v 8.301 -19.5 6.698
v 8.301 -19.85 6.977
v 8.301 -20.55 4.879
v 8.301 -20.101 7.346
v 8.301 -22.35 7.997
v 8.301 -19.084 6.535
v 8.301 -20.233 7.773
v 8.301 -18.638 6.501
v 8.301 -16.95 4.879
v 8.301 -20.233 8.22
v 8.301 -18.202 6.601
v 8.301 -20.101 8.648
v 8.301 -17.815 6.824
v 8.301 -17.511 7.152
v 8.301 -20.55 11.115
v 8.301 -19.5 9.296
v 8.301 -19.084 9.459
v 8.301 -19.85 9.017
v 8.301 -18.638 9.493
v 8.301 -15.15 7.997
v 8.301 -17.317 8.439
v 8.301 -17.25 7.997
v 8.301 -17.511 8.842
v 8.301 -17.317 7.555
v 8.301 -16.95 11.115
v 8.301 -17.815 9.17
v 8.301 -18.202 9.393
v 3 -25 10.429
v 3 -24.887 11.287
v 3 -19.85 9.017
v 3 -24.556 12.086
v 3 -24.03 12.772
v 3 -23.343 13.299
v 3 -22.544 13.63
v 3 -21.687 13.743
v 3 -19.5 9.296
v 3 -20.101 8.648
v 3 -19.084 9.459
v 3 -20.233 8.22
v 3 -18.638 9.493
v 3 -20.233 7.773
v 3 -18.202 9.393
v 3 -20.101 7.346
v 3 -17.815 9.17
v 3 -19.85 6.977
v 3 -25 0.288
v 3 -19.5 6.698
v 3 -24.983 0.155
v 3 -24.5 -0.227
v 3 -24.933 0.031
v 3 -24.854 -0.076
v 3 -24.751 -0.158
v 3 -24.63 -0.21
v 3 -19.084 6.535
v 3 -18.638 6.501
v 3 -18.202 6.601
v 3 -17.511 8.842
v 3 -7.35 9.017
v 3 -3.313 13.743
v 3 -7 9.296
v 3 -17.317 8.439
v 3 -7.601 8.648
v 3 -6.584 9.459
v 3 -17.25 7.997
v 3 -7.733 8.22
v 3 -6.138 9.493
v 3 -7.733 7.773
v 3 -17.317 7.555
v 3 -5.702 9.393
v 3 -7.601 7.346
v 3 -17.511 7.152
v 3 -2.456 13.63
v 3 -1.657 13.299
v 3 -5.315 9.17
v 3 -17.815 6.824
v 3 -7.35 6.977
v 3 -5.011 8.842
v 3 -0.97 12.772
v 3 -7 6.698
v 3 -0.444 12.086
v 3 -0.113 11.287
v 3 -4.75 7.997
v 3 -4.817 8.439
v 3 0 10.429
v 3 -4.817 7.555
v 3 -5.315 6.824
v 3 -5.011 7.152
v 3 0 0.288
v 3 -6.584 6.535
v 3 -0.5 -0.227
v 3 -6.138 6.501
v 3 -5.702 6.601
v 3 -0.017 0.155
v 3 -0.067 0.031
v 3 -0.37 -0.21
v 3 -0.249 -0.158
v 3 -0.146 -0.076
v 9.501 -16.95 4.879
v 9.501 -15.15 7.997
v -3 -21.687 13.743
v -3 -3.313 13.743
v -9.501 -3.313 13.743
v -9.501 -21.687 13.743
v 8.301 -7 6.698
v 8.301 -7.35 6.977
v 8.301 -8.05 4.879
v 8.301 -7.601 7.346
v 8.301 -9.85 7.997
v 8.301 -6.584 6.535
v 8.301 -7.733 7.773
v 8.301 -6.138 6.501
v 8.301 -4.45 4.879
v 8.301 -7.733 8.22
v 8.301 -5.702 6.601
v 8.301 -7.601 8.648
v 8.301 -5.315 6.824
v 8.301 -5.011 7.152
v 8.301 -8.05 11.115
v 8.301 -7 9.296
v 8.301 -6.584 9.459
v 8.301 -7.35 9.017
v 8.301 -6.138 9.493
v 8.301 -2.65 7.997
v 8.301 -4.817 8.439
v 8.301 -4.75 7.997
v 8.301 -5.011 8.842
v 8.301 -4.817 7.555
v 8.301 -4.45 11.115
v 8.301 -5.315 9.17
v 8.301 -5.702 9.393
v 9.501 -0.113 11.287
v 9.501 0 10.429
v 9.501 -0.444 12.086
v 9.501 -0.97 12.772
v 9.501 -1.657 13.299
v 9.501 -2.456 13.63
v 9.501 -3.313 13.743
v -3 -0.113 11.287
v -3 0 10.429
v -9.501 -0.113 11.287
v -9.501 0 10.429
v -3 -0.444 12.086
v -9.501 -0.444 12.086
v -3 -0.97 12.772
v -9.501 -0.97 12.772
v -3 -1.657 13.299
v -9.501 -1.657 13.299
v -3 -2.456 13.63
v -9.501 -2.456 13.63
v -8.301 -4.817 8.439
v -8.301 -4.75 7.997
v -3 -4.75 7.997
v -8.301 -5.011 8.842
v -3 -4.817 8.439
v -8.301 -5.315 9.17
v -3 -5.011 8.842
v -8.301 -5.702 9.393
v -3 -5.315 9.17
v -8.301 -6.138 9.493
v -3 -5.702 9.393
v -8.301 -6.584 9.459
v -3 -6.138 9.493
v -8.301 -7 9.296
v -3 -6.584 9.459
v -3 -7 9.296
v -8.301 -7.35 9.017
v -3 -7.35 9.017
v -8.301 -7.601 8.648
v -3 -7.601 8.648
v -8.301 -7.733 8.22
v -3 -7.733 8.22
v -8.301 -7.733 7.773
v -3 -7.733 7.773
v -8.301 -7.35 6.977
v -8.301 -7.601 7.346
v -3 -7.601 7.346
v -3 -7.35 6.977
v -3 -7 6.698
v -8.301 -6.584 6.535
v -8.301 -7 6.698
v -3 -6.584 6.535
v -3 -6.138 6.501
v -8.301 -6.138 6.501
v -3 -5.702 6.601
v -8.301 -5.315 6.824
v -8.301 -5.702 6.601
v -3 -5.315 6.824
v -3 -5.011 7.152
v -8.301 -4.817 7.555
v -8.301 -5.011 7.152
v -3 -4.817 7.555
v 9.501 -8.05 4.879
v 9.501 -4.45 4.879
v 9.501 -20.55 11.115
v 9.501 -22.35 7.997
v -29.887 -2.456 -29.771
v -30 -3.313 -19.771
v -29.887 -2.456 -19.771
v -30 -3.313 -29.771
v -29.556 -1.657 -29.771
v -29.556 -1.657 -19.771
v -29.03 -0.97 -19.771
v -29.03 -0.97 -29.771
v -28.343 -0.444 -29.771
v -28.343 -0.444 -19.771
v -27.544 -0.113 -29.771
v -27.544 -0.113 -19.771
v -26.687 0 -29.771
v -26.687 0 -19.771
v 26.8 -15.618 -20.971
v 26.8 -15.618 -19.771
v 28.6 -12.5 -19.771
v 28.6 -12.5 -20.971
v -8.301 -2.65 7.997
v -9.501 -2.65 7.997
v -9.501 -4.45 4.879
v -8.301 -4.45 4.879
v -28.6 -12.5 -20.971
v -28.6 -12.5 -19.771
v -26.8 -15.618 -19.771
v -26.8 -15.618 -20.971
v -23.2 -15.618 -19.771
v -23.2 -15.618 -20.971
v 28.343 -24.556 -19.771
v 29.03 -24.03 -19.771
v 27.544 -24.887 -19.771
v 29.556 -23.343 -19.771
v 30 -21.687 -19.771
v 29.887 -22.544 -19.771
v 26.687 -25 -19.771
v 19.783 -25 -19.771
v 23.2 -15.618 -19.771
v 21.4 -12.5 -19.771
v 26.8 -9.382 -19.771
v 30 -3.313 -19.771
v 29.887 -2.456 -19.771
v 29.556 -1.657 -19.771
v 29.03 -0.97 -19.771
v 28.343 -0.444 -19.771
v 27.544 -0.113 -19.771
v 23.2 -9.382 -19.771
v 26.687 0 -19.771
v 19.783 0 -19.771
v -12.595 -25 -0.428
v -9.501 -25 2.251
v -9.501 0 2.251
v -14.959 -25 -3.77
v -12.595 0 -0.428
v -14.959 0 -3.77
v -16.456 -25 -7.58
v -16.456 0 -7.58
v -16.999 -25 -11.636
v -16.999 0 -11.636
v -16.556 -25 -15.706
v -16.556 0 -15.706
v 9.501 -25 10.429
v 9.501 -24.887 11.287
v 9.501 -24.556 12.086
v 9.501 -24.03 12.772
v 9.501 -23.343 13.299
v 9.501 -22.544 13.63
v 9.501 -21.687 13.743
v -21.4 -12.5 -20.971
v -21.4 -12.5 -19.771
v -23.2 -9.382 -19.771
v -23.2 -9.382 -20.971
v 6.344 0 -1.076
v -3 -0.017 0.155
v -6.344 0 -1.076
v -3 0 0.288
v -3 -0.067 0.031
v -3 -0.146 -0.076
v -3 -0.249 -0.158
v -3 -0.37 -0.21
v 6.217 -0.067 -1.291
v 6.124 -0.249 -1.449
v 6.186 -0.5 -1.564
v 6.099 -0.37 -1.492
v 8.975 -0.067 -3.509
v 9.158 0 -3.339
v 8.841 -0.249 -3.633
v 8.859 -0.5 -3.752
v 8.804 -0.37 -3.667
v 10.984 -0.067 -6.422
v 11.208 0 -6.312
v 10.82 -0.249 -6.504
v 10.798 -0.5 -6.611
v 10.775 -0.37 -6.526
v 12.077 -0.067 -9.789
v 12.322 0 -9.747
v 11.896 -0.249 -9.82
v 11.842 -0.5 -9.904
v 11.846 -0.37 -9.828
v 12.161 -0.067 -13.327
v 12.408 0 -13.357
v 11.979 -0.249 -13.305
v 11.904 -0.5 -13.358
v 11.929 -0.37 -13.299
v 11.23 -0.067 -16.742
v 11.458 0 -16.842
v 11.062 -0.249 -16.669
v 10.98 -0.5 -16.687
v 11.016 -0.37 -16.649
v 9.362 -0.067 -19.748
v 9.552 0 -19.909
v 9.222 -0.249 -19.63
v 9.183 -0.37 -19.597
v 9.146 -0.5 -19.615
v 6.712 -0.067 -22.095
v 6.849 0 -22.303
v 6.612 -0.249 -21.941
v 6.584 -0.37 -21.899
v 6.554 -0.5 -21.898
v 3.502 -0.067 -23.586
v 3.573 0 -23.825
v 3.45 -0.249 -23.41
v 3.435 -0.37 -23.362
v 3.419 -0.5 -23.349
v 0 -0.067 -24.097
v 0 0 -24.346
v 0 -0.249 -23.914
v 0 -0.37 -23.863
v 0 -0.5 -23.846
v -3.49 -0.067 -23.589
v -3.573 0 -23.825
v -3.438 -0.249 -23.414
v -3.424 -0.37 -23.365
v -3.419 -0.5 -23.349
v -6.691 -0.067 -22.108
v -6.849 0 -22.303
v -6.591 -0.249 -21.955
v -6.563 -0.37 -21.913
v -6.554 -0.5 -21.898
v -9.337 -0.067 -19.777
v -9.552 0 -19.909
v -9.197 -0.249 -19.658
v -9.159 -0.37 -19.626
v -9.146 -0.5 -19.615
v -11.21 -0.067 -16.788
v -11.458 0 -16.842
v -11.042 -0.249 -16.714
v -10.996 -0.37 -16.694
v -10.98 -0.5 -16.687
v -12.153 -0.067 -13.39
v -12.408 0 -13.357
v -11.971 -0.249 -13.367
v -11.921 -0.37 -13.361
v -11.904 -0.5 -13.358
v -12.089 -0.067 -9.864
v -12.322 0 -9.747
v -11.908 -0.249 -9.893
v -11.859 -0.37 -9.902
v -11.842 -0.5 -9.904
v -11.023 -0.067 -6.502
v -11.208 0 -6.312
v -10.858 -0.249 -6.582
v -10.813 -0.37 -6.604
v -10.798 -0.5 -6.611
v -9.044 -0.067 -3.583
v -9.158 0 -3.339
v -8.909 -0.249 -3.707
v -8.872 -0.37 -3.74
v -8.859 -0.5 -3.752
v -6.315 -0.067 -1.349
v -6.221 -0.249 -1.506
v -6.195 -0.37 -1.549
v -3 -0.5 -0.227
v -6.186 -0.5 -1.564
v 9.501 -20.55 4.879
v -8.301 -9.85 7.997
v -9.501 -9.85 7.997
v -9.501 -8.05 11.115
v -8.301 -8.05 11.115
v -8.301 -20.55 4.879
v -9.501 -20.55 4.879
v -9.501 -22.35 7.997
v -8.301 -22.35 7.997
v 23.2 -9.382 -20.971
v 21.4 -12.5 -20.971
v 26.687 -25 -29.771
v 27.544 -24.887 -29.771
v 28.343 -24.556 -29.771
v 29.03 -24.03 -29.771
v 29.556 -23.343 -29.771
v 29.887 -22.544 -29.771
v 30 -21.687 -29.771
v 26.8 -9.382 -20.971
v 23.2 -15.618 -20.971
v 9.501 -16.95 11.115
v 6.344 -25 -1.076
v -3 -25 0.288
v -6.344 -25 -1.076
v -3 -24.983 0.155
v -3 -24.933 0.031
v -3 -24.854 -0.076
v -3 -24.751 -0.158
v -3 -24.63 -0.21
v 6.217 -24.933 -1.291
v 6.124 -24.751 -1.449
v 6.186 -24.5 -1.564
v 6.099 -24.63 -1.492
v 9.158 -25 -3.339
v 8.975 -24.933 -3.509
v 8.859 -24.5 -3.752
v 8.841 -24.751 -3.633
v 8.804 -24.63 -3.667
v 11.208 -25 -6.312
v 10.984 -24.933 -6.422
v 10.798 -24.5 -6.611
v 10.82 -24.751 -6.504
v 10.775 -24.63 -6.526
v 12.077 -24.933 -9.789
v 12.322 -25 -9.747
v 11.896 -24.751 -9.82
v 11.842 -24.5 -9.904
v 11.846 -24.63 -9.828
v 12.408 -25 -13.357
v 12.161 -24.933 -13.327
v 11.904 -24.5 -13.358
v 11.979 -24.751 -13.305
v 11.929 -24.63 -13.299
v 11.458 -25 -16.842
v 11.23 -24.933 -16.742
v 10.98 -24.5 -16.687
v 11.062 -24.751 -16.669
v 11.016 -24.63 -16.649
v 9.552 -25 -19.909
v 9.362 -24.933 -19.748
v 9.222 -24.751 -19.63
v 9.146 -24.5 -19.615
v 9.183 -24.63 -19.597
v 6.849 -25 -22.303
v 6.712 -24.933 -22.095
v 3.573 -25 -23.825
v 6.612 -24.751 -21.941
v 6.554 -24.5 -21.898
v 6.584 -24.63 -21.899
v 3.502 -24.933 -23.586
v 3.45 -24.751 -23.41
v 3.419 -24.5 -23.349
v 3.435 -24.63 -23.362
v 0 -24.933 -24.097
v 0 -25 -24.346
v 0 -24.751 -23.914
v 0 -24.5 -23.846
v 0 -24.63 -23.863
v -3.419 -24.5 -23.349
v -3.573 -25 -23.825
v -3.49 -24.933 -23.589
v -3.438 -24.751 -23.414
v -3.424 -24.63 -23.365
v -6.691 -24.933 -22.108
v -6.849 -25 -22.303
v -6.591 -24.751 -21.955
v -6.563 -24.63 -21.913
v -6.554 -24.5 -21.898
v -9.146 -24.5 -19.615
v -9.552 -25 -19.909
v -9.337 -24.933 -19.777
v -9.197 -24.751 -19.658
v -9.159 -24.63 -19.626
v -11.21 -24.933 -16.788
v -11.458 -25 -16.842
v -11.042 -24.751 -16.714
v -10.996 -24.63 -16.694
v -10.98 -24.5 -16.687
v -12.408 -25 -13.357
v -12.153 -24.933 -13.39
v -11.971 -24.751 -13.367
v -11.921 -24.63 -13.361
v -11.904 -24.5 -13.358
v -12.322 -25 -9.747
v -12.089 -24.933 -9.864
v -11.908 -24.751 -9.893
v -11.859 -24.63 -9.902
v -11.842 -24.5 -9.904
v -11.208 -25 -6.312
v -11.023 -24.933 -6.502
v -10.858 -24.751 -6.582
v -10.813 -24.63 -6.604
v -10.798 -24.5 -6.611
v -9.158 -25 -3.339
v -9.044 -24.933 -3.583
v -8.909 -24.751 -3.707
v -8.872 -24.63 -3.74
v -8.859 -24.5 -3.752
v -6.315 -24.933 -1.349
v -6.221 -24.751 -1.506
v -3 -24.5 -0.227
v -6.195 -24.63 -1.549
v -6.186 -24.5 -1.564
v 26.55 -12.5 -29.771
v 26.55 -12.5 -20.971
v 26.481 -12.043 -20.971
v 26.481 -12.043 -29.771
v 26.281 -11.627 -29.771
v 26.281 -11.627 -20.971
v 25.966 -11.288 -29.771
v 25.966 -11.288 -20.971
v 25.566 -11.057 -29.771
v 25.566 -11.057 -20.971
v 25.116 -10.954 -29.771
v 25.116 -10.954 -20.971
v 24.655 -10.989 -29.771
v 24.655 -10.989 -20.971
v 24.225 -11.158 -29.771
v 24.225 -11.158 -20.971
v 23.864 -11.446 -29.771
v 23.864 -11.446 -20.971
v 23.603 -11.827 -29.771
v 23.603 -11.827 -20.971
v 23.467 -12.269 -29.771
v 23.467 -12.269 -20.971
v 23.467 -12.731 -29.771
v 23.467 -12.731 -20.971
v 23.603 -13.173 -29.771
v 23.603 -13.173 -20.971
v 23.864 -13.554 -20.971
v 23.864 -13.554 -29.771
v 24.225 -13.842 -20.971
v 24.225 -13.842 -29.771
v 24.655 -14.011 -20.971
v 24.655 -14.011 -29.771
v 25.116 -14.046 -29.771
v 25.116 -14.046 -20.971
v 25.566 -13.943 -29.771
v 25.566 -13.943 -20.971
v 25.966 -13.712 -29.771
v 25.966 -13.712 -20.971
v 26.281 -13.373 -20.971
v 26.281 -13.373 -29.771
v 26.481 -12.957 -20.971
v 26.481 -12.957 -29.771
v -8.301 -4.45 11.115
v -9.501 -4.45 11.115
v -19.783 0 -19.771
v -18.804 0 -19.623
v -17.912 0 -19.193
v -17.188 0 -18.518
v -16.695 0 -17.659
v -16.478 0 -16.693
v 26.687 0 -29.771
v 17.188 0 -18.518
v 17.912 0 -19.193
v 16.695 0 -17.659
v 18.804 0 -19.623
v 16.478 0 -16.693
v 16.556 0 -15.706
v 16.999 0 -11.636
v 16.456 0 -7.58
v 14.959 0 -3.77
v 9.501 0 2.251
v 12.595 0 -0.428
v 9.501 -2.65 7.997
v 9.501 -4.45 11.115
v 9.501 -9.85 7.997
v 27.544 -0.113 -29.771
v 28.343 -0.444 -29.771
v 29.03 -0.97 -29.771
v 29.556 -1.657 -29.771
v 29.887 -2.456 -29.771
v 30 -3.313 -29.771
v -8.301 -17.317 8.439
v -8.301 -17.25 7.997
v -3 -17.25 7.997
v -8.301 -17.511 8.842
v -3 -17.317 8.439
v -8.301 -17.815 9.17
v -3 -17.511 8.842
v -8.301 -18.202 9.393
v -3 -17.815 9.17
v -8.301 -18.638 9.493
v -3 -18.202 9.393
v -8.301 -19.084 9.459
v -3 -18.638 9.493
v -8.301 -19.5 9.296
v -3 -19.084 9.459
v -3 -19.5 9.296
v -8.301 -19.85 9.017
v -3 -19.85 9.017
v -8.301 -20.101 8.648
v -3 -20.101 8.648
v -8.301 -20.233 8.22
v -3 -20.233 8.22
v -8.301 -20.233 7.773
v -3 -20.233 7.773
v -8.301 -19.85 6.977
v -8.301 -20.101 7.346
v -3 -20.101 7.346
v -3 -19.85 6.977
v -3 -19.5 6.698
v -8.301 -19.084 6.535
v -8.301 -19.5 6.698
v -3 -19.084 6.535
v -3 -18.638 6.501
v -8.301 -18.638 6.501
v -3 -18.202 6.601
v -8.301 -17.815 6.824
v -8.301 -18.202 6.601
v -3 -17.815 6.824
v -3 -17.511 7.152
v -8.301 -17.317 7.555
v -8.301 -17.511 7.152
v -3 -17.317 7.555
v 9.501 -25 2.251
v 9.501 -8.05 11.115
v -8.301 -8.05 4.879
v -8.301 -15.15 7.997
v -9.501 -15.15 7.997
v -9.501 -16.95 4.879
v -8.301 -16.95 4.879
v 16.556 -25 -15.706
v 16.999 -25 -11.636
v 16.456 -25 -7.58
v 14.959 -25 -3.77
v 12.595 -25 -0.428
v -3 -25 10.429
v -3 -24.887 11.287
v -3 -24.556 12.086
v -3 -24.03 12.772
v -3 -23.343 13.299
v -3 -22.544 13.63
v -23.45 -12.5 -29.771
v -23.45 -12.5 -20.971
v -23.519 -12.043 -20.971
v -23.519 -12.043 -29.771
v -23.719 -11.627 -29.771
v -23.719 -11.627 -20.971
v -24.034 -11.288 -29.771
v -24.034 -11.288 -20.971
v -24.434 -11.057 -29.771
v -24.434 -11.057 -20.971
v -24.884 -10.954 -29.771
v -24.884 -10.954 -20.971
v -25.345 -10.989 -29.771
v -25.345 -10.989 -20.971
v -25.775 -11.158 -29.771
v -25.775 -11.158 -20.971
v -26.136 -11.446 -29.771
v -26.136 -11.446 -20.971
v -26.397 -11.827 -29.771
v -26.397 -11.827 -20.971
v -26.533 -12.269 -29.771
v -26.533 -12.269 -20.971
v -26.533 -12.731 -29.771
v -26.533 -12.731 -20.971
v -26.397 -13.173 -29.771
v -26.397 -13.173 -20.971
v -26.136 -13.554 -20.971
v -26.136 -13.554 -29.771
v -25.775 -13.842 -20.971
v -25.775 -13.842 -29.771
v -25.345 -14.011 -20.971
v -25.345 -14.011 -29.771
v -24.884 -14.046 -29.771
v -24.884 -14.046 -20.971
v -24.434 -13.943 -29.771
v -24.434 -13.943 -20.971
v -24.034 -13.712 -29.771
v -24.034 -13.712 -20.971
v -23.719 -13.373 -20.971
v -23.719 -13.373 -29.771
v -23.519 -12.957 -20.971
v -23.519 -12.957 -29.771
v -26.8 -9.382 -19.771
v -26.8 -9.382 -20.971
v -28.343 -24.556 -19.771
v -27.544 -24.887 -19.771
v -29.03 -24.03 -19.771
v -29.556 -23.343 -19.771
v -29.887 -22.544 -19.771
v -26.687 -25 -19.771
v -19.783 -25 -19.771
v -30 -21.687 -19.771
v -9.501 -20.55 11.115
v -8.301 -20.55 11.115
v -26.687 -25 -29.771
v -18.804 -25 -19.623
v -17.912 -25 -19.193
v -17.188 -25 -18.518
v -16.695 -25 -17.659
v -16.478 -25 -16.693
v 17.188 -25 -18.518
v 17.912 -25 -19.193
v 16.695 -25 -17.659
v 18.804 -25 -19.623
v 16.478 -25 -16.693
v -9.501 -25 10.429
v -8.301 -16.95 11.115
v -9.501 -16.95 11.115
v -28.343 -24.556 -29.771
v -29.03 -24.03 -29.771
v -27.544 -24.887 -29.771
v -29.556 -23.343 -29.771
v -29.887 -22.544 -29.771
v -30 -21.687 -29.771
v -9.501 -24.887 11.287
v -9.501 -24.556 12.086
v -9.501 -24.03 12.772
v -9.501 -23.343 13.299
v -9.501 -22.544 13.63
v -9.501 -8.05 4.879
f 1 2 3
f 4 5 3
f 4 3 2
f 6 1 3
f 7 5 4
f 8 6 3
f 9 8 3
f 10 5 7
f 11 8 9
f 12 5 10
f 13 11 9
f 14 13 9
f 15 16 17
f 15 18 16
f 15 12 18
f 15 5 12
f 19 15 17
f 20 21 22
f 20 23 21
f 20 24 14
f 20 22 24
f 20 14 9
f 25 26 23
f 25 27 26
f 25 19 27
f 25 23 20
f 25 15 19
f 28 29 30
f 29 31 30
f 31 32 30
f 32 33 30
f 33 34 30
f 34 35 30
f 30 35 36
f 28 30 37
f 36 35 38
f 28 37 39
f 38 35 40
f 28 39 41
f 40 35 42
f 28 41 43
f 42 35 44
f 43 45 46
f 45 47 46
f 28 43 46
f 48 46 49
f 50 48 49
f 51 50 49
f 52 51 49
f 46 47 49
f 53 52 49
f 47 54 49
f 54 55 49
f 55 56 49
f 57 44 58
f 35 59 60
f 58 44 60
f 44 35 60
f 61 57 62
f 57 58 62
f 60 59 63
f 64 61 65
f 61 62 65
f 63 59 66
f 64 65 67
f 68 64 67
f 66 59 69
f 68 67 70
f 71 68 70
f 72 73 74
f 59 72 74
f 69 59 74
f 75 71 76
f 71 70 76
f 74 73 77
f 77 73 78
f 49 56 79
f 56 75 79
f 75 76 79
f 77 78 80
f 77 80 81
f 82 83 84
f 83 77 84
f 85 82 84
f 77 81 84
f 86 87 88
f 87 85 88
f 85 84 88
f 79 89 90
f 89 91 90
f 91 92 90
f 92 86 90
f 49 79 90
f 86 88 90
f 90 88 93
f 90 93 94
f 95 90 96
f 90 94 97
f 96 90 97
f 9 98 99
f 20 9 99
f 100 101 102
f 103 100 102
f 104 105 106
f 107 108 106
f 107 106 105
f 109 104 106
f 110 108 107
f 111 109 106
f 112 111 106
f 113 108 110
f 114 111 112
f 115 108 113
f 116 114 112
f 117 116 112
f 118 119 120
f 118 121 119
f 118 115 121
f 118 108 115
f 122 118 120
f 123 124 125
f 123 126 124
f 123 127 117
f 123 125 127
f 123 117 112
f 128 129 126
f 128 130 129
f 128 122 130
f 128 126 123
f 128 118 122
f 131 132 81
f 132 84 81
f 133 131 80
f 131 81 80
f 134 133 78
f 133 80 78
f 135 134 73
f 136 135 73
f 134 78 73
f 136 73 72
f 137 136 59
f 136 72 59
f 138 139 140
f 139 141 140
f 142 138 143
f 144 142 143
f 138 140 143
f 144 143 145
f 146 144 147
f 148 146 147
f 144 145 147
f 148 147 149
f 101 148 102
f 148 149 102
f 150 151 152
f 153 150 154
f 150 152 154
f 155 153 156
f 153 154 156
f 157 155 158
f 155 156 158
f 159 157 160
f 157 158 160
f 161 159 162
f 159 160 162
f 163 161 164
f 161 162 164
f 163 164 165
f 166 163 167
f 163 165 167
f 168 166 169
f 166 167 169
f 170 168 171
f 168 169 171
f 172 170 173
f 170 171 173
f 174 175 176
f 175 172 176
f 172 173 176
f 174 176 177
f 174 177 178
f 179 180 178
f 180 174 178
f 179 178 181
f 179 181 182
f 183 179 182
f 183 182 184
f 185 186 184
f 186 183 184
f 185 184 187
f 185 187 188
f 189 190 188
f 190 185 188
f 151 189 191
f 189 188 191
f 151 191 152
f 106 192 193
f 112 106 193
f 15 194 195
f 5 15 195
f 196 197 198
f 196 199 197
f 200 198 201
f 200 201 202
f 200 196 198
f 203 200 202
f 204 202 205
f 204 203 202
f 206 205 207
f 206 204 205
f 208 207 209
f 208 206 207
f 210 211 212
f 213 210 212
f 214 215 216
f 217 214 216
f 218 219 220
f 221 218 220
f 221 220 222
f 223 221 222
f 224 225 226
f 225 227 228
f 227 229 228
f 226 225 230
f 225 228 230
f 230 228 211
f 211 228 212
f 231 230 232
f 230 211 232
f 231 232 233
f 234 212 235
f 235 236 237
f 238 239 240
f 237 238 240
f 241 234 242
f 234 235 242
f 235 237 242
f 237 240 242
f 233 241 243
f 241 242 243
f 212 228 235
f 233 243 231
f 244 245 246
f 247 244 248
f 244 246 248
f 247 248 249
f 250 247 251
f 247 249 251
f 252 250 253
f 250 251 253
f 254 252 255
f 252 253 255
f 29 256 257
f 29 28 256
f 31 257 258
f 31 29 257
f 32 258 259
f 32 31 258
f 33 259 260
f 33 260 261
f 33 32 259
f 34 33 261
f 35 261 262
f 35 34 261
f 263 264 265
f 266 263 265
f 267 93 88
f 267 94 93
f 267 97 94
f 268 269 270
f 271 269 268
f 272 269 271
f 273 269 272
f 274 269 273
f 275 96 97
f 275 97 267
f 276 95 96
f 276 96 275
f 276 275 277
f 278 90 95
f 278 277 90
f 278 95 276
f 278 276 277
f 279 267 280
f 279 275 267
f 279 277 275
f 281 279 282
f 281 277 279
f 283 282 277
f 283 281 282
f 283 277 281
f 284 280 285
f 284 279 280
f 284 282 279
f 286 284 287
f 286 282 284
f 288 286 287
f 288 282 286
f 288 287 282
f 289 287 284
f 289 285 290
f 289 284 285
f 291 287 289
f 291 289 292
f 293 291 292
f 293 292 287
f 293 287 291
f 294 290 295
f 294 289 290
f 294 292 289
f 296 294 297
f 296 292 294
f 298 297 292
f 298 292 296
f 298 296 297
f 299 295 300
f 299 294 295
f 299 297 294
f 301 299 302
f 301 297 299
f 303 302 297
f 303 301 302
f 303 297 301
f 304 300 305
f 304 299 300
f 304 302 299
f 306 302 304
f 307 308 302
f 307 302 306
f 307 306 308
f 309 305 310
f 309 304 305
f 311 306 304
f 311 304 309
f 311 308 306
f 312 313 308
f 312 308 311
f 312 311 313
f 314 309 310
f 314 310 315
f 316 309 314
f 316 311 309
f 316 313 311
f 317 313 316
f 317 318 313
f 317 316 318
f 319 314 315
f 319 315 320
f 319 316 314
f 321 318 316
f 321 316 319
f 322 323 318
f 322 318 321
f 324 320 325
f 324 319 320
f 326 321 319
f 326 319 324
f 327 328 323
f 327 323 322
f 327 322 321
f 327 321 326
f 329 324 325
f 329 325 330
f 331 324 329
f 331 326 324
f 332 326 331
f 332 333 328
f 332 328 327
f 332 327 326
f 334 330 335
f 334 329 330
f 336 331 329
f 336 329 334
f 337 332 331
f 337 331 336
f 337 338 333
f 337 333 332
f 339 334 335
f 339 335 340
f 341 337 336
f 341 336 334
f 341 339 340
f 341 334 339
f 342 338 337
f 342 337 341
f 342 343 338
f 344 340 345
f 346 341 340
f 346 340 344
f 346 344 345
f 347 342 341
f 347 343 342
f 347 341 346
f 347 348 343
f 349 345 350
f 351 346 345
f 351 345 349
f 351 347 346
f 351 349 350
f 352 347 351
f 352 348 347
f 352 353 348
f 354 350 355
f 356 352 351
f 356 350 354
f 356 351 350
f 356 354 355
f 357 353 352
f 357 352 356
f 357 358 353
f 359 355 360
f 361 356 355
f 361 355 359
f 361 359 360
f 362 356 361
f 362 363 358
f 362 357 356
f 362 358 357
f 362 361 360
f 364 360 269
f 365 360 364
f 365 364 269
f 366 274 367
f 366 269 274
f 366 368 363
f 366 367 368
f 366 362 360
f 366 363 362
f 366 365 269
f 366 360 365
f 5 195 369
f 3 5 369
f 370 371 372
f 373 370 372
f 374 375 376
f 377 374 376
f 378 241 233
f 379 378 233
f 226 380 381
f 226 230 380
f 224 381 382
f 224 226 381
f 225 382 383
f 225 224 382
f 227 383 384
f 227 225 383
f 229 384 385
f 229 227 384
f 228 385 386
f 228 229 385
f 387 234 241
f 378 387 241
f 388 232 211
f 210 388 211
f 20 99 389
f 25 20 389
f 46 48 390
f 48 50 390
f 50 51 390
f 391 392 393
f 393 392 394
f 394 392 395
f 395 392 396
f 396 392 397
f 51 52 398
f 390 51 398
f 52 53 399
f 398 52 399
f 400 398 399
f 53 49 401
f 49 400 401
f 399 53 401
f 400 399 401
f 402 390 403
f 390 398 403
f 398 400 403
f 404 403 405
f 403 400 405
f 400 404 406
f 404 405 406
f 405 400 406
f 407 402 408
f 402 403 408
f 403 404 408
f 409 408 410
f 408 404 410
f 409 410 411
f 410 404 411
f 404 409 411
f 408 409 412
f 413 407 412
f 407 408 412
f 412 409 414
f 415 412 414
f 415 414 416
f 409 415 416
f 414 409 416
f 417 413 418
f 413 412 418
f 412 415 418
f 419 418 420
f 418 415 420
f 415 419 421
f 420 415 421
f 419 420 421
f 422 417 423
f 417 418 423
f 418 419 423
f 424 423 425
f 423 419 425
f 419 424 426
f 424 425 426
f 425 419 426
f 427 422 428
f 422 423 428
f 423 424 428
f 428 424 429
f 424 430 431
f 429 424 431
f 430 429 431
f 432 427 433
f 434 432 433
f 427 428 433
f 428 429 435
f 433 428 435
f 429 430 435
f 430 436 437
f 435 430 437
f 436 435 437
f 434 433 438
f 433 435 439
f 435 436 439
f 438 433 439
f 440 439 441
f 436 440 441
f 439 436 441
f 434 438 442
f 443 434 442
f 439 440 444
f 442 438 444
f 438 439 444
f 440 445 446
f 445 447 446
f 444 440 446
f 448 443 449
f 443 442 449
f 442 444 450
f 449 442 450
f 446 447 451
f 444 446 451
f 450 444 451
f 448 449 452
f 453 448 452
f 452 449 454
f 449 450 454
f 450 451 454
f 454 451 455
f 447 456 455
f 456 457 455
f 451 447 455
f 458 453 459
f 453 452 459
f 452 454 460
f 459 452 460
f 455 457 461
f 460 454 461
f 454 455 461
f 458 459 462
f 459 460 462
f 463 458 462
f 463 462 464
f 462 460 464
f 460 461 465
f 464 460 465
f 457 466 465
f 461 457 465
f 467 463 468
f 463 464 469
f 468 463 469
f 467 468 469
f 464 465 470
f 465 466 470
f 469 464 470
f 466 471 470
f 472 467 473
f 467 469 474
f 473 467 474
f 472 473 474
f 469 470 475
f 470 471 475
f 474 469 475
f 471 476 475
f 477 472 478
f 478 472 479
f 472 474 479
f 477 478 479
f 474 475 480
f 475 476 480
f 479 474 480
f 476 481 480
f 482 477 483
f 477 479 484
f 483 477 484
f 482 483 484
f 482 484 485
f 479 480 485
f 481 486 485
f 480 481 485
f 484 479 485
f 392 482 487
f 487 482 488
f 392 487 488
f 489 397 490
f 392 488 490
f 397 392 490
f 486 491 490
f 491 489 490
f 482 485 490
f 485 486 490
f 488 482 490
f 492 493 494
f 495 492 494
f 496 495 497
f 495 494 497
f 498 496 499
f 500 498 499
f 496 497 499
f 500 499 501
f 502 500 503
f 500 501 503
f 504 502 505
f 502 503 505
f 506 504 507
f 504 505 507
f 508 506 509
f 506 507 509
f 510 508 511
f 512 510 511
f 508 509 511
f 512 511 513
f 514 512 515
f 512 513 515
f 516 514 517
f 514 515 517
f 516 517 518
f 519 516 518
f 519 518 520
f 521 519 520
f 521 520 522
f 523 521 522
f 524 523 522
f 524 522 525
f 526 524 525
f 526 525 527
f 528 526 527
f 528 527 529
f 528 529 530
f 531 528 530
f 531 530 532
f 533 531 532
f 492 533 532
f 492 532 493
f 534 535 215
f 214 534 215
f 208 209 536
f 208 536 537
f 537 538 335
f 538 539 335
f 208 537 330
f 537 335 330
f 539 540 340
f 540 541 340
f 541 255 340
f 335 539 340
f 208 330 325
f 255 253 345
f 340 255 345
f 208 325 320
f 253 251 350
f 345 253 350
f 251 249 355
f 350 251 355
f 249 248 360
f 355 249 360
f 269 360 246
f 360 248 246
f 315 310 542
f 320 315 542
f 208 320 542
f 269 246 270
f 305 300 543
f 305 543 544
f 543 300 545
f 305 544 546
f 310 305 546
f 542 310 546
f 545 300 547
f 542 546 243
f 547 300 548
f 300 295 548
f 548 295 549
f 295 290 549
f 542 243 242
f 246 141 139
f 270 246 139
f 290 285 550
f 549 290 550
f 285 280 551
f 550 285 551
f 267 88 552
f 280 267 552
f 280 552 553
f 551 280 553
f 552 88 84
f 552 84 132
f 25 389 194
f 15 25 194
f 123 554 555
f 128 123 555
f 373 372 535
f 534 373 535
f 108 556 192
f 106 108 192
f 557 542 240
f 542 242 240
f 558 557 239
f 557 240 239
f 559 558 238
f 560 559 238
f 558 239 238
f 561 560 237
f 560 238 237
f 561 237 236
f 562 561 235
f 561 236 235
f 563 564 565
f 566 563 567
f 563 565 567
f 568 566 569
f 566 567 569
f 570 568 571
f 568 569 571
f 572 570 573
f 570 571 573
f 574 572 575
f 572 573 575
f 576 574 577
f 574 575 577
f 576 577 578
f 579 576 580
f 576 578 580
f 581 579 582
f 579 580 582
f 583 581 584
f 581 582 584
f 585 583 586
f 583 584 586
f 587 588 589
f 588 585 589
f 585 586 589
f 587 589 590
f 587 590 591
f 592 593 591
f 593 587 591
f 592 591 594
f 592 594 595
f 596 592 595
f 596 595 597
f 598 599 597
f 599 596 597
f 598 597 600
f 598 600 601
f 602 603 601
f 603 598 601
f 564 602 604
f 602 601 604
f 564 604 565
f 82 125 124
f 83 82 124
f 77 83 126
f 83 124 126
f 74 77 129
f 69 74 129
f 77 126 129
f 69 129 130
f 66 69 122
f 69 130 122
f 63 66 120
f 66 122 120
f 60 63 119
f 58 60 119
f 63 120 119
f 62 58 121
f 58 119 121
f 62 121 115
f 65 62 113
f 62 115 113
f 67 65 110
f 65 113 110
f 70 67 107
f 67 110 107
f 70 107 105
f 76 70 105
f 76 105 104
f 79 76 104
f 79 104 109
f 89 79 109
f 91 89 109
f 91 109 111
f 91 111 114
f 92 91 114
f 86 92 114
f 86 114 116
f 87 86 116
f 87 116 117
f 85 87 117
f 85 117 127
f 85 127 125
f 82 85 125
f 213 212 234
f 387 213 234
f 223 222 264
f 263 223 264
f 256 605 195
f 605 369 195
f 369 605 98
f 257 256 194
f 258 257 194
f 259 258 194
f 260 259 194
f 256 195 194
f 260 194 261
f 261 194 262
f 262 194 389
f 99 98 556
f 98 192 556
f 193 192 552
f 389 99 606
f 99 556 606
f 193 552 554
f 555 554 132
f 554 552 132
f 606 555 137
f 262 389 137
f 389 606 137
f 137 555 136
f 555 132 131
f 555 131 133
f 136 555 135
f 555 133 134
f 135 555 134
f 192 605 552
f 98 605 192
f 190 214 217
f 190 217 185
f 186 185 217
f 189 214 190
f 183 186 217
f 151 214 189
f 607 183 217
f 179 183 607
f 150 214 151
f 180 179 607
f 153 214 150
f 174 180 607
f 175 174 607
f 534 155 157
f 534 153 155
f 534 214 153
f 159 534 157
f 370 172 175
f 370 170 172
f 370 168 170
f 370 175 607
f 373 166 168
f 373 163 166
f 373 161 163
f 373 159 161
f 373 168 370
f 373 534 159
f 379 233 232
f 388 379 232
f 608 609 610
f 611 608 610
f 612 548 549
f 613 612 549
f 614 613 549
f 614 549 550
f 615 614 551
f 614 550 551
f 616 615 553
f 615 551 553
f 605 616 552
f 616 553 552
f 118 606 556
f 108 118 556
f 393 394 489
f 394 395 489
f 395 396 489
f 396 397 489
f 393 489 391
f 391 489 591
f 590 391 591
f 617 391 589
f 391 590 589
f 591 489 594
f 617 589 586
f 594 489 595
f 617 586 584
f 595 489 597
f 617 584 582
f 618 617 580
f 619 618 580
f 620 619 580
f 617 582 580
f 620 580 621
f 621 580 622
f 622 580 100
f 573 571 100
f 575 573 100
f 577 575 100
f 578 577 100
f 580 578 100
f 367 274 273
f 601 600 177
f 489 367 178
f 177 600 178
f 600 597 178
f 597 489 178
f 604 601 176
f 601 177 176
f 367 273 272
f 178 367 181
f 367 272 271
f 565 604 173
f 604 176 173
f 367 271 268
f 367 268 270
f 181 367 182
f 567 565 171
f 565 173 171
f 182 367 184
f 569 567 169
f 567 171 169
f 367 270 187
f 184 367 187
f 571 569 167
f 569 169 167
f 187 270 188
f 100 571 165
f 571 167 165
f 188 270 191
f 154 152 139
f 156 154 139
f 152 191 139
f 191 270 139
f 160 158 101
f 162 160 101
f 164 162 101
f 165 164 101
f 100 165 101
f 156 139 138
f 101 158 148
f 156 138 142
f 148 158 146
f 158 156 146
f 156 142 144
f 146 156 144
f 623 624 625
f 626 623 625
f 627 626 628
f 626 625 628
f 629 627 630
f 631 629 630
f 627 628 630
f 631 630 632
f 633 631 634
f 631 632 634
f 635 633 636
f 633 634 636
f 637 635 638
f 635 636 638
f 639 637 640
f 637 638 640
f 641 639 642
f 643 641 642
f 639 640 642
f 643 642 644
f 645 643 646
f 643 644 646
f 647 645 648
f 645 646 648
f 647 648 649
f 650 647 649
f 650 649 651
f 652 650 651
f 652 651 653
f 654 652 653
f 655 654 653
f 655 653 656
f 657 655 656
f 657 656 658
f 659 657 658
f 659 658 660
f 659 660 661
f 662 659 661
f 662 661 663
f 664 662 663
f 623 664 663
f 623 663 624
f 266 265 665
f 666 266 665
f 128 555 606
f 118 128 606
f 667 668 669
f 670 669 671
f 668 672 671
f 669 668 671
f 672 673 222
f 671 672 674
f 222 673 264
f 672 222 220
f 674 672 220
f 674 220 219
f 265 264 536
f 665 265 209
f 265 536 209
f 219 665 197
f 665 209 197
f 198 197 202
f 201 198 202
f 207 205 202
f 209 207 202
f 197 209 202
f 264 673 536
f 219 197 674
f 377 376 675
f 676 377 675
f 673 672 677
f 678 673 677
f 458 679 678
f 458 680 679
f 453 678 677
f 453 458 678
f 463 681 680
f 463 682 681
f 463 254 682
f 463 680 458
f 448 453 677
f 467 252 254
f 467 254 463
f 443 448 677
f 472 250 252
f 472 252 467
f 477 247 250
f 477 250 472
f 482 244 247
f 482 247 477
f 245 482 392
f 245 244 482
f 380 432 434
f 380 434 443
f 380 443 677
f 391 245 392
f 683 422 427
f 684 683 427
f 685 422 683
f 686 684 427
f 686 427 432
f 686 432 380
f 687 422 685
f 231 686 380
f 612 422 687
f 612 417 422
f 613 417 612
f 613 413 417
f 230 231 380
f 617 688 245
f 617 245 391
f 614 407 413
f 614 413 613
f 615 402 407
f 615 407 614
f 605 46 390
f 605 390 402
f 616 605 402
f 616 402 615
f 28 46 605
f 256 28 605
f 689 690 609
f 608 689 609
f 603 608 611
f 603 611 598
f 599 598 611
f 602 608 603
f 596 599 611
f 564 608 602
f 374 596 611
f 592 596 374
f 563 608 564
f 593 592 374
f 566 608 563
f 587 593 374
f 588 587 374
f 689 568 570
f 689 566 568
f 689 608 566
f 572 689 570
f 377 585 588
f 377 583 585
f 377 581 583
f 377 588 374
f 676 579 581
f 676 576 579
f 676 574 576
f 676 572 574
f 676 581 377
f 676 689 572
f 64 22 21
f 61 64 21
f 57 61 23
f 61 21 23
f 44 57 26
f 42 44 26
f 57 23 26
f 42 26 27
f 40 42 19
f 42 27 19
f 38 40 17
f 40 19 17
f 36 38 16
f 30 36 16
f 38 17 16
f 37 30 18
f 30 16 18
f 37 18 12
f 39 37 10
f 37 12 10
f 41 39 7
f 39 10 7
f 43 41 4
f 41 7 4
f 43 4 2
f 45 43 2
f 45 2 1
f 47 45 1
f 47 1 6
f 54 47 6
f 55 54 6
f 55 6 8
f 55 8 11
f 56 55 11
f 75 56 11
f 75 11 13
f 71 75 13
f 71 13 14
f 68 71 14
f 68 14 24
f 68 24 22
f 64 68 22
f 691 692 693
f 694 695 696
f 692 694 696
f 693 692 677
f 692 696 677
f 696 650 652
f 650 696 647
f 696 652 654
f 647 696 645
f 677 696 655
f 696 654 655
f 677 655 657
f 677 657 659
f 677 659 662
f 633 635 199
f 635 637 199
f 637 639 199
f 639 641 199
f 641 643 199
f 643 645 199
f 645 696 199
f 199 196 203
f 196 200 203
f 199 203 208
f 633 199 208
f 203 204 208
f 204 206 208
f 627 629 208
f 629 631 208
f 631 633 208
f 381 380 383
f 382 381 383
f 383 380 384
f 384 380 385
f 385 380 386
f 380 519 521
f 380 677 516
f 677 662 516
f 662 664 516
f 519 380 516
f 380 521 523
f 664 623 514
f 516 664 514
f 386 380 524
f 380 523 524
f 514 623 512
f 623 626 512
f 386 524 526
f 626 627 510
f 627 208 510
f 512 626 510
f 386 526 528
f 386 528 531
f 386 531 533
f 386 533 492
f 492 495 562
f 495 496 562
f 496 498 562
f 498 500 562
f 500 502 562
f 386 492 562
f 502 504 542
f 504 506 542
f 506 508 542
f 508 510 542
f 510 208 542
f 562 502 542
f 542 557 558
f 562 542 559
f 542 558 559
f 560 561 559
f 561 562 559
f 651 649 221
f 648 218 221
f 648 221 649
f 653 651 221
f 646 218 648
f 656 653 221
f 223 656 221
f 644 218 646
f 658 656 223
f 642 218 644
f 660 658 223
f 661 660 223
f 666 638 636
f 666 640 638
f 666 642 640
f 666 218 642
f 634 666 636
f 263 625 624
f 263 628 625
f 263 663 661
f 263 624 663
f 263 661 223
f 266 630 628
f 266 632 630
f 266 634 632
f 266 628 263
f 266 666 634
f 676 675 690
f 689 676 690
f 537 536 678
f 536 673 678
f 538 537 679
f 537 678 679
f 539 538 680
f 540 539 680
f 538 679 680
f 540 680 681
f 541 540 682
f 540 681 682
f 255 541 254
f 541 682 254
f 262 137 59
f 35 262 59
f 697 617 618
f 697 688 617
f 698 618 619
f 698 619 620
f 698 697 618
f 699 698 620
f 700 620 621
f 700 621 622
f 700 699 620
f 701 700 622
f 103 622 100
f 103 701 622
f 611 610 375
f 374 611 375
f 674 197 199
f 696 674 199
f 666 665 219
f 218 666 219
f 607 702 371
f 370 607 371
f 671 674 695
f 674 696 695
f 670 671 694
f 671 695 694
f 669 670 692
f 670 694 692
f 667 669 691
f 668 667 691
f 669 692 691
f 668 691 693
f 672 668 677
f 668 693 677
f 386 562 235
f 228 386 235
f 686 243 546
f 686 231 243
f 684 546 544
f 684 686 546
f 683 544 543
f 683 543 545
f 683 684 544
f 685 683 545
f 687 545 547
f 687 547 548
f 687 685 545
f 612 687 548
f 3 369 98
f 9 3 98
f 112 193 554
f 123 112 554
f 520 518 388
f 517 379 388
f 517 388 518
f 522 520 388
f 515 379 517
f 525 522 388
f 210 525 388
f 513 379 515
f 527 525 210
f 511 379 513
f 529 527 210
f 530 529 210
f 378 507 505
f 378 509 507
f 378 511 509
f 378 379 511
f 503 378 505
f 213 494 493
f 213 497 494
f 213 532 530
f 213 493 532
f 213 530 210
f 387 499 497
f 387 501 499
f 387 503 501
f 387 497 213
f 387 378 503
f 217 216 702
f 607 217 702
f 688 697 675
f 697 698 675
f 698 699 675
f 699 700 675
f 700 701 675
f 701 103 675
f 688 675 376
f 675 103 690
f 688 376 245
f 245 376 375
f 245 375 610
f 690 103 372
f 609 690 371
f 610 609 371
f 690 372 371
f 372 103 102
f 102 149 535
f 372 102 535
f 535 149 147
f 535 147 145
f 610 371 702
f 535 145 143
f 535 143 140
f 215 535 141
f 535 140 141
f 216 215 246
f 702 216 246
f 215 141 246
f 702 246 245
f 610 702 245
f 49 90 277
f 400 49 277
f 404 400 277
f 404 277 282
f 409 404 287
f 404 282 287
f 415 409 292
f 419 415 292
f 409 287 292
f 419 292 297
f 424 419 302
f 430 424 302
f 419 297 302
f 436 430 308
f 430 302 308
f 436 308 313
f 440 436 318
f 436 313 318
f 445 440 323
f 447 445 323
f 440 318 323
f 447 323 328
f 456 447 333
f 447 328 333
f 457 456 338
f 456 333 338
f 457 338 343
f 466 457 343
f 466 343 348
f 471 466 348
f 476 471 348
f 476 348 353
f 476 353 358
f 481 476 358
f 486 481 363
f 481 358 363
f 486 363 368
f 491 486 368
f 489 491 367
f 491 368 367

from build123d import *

# Parameters (mm, degrees)
F1_DEPTH  = 25
F2_R      = 1.55
F3_DEPTH  = 25
F4_R      = 1.5
F5_DEPTH  = 25
F6_R      = 3.313414
F9_DEPTH  = 1.2
F8_R      = 1.5
F10_DEPTH = 1.2
F12_DEPTH = 1.2
F13_R     = 0.5


with BuildPart() as f1:
    # F0 (on Front) → F1 (new body)
    with BuildSketch(Plane.XZ):
        with BuildLine():
            Line((-30, -29.771222), (30, -29.771222))
            Line((30, -29.771222), (30, -19.771222))
            Line((30, -19.771222), (15.039818, -19.771222))
            ThreePointArc((15.039818, -19.771222), (16.48651, -7.699644), (9.500786, 2.251013))
            Line((9.500786, 2.251013), (9.500786, 13.742813))
            Line((9.500786, 13.742813), (3, 13.742813))
            Line((3, 13.742813), (3, 4.886871))
            Line((3, 4.886871), (3, -0.22738))
            ThreePointArc((3, -0.22738), (0, -23.84633), (-3, -0.22738))
            Line((-3, -0.22738), (-3, 4.886871))
            Line((-3, 4.886871), (-3, 13.742813))
            Line((-3, 13.742813), (-9.500786, 13.742813))
            Line((-9.500786, 13.742813), (-9.500786, 2.251013))
            ThreePointArc((-9.500786, 2.251013), (-16.48651, -7.699644), (-15.039818, -19.771222))
            Line((-15.039818, -19.771222), (-30, -19.771222))
            Line((-30, -19.771222), (-30, -29.771222))
        make_face()
    extrude(amount=F1_DEPTH)

    # F2 (on face) → F3 (cut)
    with BuildSketch(Plane.XY.offset(-19.771222)):
        with Locations((-25, -12.5)):
            Circle(F2_R)
        with Locations((25, -12.5)):
            Circle(F2_R)
    extrude(amount=-F3_DEPTH, mode=Mode.SUBTRACT)

    # F4 (on face) → F5 (cut)
    with BuildSketch(Plane.YZ.offset(9.500786)):
        with Locations((-18.75, 7.996913)):
            Circle(F4_R)
        with Locations((-6.25, 7.996913)):
            Circle(F4_R)
    extrude(amount=-F5_DEPTH, mode=Mode.SUBTRACT)

    # F6
    f6_edges = [f1.edges().sort_by_distance(p)[0] for p in [
        (-6.250393, -25, 13.742813),
        (6.250393, -25, 13.742813),
        (-6.250393, 0, 13.742813),
        (6.250393, 0, 13.742813),
        (30, -25, -24.771222),
        (30, 0, -24.771222),
        (-30, 0, -24.771222),
        (-30, -25, -24.771222),
        (15.039818, -12.5, -19.771222),
        (-15.039818, -12.5, -19.771222),
    ]]
    fillet(f6_edges, radius=F6_R)

    # F7 (on face) → F9 (cut)
    with BuildSketch(Plane.YZ.offset(9.500786)):
        Polygon((-20.55, 4.879222), (-16.95, 4.879222), (-15.15, 7.996913), (-16.95, 11.114605), (-20.55, 11.114605), (-22.35, 7.996913), align=None)
        Polygon((-4.45, 11.114605), (-8.05, 11.114605), (-9.85, 7.996913), (-8.05, 4.879222), (-4.45, 4.879222), (-2.65, 7.996913), align=None)
    extrude(amount=-F9_DEPTH, mode=Mode.SUBTRACT)

    # F8 (on face) → F10 (cut)
    with BuildSketch(Plane(origin=(-9.500786, 0, 0), x_dir=(0, -1, 0), z_dir=(-1, 0, 0))):
        Polygon((4.45, 4.879222), (8.05, 4.879222), (9.85, 7.996913), (8.05, 11.114605), (4.45, 11.114605), (2.65, 7.996913), align=None)
        with Locations((6.25, 7.996913)):
            Circle(F8_R, mode=Mode.SUBTRACT)
        Polygon((20.55, 11.114605), (16.95, 11.114605), (15.15, 7.996913), (16.95, 4.879222), (20.55, 4.879222), (22.35, 7.996913), align=None)
        with Locations((18.75, 7.996913)):
            Circle(F8_R, mode=Mode.SUBTRACT)
    extrude(amount=-F10_DEPTH, mode=Mode.SUBTRACT)

    # F11 (on face) → F12 (cut)
    with BuildSketch(Plane.XY.offset(-19.771222)):
        Polygon((26.8, -9.382309), (23.2, -9.382309), (21.4, -12.5), (23.2, -15.617691), (26.8, -15.617691), (28.6, -12.5), align=None)
        Polygon((-23.2, -15.617691), (-21.4, -12.5), (-23.2, -9.382309), (-26.8, -9.382309), (-28.6, -12.5), (-26.8, -15.617691), align=None)
    extrude(amount=-F12_DEPTH, mode=Mode.SUBTRACT)

    # F13
    f13_edges = [f1.edges().sort_by_distance(p)[0] for p in [
        (0, 0, -23.84633),
        (0, -25, -23.84633),
    ]]
    fillet(f13_edges, radius=F13_R)


solid = f1.part
